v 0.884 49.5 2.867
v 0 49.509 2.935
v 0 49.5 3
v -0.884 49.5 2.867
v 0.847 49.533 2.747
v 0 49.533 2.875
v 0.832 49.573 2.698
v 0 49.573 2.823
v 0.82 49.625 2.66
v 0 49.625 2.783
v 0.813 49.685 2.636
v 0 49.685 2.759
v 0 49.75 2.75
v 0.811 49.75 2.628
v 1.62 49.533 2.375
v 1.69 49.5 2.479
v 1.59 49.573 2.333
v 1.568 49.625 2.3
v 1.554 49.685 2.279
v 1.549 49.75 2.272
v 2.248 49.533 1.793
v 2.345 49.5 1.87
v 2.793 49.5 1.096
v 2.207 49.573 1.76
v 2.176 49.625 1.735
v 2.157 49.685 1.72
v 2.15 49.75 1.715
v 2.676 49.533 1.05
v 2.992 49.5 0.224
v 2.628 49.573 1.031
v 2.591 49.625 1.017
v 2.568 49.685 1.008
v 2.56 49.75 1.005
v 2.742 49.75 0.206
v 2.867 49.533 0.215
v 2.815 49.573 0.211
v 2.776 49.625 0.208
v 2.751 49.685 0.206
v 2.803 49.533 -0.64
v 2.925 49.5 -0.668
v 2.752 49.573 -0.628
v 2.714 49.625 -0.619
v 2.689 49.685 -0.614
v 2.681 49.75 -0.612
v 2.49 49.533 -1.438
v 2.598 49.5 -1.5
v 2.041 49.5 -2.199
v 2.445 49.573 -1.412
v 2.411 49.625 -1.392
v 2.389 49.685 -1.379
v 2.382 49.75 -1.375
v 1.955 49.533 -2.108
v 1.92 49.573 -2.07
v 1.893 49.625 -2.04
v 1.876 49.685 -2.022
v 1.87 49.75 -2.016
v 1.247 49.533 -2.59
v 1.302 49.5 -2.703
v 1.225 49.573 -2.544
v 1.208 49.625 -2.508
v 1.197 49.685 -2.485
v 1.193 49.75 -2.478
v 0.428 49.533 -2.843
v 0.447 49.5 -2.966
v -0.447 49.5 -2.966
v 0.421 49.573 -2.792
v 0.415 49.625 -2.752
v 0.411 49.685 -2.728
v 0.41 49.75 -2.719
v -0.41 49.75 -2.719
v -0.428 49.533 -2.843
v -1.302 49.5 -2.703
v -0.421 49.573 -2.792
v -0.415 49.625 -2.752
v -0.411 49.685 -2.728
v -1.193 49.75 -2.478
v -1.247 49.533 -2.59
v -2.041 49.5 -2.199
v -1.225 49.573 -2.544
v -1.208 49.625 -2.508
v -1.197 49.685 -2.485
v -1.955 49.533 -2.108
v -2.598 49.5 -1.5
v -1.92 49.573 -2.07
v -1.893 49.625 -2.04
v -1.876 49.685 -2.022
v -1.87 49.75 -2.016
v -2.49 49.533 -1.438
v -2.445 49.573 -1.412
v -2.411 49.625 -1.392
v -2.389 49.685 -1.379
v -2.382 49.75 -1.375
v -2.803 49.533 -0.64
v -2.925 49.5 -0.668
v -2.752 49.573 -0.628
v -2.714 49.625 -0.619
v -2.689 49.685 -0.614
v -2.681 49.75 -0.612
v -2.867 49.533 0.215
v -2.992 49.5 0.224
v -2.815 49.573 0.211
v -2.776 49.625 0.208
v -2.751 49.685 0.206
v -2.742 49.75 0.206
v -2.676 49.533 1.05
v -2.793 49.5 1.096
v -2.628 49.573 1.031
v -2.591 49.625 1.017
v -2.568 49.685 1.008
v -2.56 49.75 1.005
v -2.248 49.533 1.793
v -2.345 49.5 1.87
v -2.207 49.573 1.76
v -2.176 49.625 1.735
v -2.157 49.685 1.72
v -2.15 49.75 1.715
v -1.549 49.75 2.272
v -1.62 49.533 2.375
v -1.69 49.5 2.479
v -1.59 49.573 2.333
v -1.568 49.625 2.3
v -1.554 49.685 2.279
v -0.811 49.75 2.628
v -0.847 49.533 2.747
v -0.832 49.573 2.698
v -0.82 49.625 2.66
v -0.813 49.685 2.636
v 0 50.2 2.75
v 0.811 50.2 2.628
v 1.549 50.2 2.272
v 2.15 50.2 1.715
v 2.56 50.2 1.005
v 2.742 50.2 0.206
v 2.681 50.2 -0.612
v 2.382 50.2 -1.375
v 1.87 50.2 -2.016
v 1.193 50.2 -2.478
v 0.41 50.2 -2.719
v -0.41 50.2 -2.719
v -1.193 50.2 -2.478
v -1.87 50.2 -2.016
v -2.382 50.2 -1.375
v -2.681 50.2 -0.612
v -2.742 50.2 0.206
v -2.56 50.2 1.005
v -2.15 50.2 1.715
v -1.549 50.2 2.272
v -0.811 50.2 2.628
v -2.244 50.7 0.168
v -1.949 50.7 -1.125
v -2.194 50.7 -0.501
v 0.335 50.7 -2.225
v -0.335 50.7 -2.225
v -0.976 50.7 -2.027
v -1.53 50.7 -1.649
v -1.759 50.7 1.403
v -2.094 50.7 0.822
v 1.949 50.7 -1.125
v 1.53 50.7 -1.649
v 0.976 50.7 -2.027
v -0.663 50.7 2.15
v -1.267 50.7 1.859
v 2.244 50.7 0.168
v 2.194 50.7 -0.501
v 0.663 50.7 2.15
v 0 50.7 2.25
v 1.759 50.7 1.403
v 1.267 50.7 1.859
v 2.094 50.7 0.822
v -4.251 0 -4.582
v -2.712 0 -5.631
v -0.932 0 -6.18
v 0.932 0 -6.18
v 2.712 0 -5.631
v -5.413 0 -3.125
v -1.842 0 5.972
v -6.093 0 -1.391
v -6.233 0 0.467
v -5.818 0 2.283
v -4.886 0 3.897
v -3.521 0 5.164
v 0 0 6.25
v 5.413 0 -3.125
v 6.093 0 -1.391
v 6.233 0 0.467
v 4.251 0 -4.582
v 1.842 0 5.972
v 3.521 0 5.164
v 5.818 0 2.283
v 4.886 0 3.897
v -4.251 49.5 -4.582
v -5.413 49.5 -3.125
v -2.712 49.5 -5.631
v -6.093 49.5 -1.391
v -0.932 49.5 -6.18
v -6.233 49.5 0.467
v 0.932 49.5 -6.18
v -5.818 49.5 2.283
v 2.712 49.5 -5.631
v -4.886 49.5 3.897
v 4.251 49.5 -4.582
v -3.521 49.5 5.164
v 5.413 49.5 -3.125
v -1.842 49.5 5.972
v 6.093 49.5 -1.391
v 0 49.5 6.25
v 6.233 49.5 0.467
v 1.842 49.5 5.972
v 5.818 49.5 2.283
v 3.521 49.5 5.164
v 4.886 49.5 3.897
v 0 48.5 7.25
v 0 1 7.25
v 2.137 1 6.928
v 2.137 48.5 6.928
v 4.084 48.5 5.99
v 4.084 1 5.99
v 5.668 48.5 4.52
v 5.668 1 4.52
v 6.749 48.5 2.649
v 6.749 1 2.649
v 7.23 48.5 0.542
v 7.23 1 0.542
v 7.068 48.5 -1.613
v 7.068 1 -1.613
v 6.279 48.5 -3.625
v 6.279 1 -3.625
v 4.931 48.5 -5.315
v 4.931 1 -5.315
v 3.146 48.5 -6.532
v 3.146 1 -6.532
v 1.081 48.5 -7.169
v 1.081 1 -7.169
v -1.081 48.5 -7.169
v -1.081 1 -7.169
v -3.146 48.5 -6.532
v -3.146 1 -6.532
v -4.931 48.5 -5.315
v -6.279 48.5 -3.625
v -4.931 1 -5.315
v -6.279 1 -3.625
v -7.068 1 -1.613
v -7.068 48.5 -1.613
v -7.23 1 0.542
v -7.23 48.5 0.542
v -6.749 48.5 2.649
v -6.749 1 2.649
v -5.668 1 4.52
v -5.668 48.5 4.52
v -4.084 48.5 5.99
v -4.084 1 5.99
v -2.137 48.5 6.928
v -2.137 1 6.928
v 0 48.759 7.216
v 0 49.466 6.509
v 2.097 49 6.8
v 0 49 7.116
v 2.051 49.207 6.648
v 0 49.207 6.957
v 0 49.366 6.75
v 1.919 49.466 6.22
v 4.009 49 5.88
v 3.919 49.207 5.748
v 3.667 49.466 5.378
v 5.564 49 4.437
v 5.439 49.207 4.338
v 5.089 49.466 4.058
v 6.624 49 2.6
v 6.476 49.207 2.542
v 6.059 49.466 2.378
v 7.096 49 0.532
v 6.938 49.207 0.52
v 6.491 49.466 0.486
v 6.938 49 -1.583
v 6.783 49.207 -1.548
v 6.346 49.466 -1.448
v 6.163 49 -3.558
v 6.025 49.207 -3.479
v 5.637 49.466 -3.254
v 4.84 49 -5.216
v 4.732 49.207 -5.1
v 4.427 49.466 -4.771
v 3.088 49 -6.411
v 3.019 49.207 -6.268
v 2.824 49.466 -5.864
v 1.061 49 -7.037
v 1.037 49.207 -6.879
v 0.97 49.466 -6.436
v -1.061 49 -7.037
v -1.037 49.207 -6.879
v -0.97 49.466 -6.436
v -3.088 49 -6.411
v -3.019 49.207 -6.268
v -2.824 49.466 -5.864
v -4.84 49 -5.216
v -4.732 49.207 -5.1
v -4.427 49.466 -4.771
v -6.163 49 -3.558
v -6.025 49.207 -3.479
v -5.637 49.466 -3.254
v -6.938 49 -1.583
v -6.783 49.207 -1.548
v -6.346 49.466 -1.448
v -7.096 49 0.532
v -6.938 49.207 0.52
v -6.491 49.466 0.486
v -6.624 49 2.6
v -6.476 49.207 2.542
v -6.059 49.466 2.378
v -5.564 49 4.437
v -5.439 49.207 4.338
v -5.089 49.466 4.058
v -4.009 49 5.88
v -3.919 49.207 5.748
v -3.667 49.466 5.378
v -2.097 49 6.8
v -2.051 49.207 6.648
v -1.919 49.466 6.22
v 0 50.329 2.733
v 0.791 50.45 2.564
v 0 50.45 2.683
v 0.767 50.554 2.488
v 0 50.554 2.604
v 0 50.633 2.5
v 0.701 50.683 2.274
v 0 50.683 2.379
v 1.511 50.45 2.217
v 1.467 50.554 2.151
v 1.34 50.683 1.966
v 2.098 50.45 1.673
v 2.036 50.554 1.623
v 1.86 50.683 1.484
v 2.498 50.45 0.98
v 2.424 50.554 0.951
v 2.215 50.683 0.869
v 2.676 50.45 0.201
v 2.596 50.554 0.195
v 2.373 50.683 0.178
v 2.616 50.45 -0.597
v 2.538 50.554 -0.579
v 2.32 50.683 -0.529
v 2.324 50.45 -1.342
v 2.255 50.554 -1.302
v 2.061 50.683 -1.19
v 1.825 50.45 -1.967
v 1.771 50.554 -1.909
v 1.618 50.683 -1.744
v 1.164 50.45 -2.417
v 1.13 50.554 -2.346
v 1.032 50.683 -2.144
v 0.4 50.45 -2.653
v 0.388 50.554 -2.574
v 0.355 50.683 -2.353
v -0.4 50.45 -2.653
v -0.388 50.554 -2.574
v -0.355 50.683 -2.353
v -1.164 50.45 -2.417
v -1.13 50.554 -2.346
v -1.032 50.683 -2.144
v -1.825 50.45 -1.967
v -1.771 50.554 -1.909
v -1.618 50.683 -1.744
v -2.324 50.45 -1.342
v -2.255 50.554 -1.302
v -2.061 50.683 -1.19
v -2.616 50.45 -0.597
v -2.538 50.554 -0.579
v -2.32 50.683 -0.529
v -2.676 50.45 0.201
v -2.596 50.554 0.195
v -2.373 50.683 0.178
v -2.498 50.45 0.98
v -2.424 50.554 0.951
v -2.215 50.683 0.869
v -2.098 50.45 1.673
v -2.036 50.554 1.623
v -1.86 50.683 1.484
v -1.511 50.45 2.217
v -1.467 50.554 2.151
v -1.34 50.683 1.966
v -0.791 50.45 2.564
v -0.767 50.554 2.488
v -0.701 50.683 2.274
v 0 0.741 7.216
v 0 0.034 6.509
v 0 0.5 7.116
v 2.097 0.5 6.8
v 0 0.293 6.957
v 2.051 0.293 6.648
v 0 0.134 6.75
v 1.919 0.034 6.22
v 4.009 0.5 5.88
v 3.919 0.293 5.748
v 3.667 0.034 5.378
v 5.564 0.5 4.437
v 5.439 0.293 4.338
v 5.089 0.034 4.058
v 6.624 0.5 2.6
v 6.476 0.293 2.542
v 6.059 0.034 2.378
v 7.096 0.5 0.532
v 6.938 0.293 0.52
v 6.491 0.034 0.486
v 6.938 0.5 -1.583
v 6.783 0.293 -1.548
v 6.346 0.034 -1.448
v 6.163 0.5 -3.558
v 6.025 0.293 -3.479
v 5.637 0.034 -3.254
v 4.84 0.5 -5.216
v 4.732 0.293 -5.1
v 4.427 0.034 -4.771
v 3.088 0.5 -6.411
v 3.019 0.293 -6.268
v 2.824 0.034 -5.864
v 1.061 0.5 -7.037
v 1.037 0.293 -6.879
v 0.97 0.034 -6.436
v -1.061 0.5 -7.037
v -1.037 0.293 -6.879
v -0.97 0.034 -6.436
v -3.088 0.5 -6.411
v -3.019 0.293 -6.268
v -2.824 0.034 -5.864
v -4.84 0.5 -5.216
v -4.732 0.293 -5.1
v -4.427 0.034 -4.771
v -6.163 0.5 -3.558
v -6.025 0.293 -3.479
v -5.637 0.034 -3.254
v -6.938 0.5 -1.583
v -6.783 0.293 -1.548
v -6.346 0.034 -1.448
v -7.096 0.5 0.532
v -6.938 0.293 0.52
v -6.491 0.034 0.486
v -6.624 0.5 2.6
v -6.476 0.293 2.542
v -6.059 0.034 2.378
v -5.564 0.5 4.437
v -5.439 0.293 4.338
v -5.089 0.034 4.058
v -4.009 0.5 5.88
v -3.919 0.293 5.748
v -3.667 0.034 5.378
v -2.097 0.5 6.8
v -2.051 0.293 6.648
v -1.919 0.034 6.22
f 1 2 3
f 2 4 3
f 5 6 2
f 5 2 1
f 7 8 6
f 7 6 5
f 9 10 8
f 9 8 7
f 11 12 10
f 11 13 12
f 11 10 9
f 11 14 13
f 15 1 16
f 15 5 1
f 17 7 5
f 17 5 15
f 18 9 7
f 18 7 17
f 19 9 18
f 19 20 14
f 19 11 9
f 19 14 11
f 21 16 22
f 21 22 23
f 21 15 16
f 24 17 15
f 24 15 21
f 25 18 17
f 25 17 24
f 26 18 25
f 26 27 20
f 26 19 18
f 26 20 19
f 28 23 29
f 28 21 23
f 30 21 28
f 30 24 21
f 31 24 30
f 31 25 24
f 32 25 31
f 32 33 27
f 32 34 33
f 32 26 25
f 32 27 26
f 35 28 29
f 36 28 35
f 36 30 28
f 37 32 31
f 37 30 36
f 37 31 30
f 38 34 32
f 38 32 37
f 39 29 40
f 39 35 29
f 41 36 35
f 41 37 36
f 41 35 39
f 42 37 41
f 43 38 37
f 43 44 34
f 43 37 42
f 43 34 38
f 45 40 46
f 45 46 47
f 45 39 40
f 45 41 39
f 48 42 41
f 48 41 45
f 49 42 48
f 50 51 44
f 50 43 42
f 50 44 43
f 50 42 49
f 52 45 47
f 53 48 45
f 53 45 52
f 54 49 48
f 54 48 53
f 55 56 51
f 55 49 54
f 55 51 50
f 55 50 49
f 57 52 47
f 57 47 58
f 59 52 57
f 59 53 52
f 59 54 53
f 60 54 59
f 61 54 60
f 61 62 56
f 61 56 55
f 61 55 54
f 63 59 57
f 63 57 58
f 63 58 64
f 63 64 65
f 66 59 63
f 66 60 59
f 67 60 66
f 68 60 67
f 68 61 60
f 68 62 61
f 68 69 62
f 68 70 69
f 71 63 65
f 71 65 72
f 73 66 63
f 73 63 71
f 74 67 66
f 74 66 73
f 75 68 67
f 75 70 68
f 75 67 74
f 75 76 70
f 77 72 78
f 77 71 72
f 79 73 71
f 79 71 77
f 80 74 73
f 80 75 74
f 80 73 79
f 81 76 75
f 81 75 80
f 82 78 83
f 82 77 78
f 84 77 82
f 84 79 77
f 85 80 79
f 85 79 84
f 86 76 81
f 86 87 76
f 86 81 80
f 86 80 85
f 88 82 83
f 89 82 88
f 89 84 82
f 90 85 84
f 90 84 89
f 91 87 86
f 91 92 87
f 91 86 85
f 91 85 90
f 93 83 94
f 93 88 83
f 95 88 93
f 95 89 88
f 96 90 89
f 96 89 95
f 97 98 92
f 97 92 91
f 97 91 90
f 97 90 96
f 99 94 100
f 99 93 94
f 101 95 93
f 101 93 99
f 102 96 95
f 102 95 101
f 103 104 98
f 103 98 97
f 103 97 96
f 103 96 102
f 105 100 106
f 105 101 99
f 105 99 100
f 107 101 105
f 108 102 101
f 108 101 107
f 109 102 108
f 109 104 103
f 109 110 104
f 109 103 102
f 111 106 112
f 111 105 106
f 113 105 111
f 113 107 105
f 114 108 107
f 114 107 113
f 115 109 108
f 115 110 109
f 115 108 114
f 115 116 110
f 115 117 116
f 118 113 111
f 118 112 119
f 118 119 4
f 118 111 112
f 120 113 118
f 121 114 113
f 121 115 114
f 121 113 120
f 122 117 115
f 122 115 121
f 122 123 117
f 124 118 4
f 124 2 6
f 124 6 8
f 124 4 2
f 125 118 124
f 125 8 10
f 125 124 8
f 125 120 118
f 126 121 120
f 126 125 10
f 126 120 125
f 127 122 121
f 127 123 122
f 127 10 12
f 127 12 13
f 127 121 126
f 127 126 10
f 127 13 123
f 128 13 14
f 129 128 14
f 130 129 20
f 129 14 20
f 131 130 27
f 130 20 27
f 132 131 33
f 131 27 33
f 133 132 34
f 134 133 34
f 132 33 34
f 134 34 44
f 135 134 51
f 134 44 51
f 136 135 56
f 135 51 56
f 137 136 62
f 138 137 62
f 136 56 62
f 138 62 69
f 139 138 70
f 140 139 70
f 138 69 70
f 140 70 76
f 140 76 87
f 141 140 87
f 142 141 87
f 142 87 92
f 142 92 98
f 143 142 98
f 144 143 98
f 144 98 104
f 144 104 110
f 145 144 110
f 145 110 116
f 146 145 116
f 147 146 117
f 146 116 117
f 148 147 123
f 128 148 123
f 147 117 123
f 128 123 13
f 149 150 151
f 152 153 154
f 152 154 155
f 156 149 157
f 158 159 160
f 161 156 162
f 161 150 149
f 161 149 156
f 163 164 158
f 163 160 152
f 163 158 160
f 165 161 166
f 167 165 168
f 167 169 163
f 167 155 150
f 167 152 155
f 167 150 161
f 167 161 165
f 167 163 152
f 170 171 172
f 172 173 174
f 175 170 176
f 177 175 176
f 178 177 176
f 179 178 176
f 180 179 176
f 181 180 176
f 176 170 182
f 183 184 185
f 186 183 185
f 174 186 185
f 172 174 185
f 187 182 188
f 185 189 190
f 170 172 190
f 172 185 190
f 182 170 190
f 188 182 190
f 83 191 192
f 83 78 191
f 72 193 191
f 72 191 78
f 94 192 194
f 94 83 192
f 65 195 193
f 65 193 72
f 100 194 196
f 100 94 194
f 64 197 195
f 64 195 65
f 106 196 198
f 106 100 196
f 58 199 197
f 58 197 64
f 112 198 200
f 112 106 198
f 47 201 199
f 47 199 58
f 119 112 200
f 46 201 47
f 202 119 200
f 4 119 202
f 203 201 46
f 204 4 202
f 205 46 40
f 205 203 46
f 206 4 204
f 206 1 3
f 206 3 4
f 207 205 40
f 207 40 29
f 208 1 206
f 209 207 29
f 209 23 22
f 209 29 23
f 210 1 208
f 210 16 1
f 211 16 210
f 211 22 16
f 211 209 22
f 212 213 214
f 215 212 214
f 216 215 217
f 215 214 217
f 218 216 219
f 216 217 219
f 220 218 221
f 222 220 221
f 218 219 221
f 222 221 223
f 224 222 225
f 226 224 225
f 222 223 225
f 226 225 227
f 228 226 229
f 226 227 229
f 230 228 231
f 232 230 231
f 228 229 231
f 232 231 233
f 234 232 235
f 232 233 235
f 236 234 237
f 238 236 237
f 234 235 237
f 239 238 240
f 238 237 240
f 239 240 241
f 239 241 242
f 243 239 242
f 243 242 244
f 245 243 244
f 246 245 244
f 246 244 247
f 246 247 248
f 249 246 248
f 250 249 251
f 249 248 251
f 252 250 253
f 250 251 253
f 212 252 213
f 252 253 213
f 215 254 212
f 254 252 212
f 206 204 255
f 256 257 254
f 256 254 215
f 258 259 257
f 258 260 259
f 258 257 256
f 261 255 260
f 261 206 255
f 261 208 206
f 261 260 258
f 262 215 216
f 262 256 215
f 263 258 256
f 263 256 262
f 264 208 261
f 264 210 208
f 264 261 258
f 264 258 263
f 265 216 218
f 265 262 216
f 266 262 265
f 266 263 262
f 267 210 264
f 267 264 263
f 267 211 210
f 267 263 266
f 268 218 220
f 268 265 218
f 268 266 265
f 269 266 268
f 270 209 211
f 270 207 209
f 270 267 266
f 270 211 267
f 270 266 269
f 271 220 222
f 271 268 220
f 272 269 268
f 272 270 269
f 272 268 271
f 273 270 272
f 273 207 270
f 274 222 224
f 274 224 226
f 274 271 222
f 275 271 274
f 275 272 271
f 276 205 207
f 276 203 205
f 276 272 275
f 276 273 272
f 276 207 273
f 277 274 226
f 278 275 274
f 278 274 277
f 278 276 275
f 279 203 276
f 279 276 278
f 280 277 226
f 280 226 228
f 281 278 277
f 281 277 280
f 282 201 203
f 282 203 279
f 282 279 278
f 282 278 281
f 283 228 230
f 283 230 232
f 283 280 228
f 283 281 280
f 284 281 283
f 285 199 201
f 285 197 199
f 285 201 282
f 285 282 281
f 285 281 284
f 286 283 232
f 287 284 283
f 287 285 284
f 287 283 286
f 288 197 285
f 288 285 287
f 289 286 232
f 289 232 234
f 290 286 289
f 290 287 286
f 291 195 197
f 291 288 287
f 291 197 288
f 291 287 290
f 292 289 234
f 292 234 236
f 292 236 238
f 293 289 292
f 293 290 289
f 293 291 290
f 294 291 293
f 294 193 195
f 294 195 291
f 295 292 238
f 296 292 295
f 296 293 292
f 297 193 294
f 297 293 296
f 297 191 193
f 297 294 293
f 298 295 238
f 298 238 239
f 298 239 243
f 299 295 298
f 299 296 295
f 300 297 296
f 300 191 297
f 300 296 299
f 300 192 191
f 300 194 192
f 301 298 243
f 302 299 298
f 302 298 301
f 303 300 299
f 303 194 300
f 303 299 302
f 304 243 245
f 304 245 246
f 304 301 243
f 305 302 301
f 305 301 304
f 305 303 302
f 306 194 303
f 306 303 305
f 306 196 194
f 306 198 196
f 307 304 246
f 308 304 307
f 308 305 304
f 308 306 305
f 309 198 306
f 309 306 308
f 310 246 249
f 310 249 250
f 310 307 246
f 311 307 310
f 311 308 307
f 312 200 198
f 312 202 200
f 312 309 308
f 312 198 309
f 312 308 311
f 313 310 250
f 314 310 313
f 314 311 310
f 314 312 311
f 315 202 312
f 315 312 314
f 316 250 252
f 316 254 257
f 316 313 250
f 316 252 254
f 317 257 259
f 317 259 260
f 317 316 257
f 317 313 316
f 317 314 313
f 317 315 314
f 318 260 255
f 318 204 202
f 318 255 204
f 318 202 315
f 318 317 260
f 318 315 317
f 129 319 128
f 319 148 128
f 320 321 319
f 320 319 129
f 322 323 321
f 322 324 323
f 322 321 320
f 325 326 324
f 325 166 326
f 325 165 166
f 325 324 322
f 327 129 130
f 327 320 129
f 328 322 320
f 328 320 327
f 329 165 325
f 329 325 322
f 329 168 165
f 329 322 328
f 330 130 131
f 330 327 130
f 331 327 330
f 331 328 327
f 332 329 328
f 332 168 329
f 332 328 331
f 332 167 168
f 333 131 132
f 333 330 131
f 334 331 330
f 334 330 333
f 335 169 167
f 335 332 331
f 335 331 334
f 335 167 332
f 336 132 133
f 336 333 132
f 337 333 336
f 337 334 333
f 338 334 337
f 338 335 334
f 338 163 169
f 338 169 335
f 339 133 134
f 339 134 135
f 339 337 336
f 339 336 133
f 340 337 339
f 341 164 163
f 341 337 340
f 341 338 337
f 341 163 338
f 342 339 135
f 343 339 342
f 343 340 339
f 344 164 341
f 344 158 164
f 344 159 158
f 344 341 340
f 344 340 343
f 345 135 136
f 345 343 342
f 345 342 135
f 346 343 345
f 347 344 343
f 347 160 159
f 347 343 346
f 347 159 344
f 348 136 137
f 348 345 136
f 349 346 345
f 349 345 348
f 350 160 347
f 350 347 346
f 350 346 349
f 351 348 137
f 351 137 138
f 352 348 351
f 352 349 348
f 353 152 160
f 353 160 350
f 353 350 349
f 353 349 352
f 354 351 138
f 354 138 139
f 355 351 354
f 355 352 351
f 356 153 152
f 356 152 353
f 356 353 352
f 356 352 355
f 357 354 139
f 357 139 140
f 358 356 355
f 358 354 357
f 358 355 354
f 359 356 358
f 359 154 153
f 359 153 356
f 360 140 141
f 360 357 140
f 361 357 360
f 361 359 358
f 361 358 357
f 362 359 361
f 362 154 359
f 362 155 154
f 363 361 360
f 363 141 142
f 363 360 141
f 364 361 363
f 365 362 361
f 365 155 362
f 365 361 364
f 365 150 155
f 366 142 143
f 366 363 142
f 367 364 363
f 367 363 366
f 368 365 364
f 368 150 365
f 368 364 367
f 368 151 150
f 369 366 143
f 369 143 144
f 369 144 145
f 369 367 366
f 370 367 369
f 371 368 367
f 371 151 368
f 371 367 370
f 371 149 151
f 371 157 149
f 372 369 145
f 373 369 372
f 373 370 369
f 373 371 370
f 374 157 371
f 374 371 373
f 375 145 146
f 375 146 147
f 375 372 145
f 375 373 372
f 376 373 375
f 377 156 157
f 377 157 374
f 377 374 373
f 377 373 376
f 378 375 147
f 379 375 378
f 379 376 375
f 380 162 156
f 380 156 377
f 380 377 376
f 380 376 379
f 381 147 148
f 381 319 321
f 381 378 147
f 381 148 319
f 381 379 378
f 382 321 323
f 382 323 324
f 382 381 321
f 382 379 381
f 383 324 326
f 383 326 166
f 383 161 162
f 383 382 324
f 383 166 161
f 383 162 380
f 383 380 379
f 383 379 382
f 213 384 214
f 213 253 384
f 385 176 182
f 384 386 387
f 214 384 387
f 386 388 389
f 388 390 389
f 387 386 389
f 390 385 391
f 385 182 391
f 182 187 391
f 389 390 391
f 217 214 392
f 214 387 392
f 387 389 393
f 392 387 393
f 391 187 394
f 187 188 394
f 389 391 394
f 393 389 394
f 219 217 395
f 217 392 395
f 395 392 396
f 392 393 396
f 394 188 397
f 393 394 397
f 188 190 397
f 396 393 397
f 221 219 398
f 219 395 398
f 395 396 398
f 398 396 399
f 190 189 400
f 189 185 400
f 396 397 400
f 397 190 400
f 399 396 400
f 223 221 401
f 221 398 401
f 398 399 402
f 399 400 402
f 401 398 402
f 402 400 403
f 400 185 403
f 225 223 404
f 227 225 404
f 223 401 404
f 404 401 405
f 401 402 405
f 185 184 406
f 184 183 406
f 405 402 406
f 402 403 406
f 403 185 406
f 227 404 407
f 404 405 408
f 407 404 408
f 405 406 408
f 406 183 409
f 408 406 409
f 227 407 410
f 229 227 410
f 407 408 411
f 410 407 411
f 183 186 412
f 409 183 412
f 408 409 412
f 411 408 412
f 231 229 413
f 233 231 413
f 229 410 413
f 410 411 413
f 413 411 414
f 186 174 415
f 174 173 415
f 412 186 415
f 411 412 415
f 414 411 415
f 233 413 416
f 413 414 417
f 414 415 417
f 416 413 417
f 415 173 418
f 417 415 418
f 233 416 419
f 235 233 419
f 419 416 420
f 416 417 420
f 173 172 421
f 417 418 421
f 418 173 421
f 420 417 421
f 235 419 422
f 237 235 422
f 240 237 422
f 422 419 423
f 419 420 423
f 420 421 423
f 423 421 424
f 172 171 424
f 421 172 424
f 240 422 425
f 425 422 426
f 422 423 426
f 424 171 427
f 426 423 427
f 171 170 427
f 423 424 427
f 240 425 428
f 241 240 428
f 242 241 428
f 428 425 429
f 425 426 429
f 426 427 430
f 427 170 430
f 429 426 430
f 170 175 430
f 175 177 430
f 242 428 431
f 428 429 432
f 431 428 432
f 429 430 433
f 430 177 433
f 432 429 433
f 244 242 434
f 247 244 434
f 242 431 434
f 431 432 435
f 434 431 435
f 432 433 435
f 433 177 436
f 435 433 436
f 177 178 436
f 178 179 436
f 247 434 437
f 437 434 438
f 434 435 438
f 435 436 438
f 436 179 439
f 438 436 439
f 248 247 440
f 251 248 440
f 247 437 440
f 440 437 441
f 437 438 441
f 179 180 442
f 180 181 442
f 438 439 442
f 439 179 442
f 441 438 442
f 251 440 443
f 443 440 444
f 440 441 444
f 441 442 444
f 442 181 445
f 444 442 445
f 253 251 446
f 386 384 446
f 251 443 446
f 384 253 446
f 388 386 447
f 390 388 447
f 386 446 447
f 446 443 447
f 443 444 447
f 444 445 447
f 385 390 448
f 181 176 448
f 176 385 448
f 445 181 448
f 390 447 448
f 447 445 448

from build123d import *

# Parameters (mm, degrees)
SKETCH1_R           = 7.25
BOSS_EXTRUDE4_DEPTH = 49.5
SKETCH8_R           = 2.75
BOSS_EXTRUDE5_DEPTH = 1.2
FILLET1_R           = 1
FILLET3_R           = 0.25
FILLET4_R           = 0.5


with BuildPart() as part:
    # Sketch1 → Boss-Extrude4 (new body)
    with BuildSketch(Plane(origin=(0, 0, 0), x_dir=(1, 0, 0), z_dir=(0, 1, 0))):
        with Locations(Location((0, 0, 0), (0, 0, 270))):
            Circle(SKETCH1_R)
    extrude(amount=BOSS_EXTRUDE4_DEPTH)

    # Sketch8 → Boss-Extrude5 (add)
    with BuildSketch(Plane(origin=(0, 49.5, 0), x_dir=(1, 0, 0), z_dir=(0, 1, 0))):
        with Locations(Location((0, 0, 0), (0, 0, 270))):
            Circle(SKETCH8_R)
    extrude(amount=BOSS_EXTRUDE5_DEPTH)

    # Fillet1
    fillet1_edges = [part.edges().sort_by_distance(p)[0] for p in [
        (0, 0, -7.25),
        (0, 49.5, -7.25),
    ]]
    fillet(fillet1_edges, radius=FILLET1_R)

    # Fillet3
    fillet3_edges = [part.edges().sort_by_distance(p)[0] for p in [
        (0, 49.5, -2.75),
    ]]
    fillet(fillet3_edges, radius=FILLET3_R)

    # Fillet4
    fillet4_edges = [part.edges().sort_by_distance(p)[0] for p in [
        (0, 50.7, -2.75),
    ]]
    fillet(fillet4_edges, radius=FILLET4_R)


solid = part.part
